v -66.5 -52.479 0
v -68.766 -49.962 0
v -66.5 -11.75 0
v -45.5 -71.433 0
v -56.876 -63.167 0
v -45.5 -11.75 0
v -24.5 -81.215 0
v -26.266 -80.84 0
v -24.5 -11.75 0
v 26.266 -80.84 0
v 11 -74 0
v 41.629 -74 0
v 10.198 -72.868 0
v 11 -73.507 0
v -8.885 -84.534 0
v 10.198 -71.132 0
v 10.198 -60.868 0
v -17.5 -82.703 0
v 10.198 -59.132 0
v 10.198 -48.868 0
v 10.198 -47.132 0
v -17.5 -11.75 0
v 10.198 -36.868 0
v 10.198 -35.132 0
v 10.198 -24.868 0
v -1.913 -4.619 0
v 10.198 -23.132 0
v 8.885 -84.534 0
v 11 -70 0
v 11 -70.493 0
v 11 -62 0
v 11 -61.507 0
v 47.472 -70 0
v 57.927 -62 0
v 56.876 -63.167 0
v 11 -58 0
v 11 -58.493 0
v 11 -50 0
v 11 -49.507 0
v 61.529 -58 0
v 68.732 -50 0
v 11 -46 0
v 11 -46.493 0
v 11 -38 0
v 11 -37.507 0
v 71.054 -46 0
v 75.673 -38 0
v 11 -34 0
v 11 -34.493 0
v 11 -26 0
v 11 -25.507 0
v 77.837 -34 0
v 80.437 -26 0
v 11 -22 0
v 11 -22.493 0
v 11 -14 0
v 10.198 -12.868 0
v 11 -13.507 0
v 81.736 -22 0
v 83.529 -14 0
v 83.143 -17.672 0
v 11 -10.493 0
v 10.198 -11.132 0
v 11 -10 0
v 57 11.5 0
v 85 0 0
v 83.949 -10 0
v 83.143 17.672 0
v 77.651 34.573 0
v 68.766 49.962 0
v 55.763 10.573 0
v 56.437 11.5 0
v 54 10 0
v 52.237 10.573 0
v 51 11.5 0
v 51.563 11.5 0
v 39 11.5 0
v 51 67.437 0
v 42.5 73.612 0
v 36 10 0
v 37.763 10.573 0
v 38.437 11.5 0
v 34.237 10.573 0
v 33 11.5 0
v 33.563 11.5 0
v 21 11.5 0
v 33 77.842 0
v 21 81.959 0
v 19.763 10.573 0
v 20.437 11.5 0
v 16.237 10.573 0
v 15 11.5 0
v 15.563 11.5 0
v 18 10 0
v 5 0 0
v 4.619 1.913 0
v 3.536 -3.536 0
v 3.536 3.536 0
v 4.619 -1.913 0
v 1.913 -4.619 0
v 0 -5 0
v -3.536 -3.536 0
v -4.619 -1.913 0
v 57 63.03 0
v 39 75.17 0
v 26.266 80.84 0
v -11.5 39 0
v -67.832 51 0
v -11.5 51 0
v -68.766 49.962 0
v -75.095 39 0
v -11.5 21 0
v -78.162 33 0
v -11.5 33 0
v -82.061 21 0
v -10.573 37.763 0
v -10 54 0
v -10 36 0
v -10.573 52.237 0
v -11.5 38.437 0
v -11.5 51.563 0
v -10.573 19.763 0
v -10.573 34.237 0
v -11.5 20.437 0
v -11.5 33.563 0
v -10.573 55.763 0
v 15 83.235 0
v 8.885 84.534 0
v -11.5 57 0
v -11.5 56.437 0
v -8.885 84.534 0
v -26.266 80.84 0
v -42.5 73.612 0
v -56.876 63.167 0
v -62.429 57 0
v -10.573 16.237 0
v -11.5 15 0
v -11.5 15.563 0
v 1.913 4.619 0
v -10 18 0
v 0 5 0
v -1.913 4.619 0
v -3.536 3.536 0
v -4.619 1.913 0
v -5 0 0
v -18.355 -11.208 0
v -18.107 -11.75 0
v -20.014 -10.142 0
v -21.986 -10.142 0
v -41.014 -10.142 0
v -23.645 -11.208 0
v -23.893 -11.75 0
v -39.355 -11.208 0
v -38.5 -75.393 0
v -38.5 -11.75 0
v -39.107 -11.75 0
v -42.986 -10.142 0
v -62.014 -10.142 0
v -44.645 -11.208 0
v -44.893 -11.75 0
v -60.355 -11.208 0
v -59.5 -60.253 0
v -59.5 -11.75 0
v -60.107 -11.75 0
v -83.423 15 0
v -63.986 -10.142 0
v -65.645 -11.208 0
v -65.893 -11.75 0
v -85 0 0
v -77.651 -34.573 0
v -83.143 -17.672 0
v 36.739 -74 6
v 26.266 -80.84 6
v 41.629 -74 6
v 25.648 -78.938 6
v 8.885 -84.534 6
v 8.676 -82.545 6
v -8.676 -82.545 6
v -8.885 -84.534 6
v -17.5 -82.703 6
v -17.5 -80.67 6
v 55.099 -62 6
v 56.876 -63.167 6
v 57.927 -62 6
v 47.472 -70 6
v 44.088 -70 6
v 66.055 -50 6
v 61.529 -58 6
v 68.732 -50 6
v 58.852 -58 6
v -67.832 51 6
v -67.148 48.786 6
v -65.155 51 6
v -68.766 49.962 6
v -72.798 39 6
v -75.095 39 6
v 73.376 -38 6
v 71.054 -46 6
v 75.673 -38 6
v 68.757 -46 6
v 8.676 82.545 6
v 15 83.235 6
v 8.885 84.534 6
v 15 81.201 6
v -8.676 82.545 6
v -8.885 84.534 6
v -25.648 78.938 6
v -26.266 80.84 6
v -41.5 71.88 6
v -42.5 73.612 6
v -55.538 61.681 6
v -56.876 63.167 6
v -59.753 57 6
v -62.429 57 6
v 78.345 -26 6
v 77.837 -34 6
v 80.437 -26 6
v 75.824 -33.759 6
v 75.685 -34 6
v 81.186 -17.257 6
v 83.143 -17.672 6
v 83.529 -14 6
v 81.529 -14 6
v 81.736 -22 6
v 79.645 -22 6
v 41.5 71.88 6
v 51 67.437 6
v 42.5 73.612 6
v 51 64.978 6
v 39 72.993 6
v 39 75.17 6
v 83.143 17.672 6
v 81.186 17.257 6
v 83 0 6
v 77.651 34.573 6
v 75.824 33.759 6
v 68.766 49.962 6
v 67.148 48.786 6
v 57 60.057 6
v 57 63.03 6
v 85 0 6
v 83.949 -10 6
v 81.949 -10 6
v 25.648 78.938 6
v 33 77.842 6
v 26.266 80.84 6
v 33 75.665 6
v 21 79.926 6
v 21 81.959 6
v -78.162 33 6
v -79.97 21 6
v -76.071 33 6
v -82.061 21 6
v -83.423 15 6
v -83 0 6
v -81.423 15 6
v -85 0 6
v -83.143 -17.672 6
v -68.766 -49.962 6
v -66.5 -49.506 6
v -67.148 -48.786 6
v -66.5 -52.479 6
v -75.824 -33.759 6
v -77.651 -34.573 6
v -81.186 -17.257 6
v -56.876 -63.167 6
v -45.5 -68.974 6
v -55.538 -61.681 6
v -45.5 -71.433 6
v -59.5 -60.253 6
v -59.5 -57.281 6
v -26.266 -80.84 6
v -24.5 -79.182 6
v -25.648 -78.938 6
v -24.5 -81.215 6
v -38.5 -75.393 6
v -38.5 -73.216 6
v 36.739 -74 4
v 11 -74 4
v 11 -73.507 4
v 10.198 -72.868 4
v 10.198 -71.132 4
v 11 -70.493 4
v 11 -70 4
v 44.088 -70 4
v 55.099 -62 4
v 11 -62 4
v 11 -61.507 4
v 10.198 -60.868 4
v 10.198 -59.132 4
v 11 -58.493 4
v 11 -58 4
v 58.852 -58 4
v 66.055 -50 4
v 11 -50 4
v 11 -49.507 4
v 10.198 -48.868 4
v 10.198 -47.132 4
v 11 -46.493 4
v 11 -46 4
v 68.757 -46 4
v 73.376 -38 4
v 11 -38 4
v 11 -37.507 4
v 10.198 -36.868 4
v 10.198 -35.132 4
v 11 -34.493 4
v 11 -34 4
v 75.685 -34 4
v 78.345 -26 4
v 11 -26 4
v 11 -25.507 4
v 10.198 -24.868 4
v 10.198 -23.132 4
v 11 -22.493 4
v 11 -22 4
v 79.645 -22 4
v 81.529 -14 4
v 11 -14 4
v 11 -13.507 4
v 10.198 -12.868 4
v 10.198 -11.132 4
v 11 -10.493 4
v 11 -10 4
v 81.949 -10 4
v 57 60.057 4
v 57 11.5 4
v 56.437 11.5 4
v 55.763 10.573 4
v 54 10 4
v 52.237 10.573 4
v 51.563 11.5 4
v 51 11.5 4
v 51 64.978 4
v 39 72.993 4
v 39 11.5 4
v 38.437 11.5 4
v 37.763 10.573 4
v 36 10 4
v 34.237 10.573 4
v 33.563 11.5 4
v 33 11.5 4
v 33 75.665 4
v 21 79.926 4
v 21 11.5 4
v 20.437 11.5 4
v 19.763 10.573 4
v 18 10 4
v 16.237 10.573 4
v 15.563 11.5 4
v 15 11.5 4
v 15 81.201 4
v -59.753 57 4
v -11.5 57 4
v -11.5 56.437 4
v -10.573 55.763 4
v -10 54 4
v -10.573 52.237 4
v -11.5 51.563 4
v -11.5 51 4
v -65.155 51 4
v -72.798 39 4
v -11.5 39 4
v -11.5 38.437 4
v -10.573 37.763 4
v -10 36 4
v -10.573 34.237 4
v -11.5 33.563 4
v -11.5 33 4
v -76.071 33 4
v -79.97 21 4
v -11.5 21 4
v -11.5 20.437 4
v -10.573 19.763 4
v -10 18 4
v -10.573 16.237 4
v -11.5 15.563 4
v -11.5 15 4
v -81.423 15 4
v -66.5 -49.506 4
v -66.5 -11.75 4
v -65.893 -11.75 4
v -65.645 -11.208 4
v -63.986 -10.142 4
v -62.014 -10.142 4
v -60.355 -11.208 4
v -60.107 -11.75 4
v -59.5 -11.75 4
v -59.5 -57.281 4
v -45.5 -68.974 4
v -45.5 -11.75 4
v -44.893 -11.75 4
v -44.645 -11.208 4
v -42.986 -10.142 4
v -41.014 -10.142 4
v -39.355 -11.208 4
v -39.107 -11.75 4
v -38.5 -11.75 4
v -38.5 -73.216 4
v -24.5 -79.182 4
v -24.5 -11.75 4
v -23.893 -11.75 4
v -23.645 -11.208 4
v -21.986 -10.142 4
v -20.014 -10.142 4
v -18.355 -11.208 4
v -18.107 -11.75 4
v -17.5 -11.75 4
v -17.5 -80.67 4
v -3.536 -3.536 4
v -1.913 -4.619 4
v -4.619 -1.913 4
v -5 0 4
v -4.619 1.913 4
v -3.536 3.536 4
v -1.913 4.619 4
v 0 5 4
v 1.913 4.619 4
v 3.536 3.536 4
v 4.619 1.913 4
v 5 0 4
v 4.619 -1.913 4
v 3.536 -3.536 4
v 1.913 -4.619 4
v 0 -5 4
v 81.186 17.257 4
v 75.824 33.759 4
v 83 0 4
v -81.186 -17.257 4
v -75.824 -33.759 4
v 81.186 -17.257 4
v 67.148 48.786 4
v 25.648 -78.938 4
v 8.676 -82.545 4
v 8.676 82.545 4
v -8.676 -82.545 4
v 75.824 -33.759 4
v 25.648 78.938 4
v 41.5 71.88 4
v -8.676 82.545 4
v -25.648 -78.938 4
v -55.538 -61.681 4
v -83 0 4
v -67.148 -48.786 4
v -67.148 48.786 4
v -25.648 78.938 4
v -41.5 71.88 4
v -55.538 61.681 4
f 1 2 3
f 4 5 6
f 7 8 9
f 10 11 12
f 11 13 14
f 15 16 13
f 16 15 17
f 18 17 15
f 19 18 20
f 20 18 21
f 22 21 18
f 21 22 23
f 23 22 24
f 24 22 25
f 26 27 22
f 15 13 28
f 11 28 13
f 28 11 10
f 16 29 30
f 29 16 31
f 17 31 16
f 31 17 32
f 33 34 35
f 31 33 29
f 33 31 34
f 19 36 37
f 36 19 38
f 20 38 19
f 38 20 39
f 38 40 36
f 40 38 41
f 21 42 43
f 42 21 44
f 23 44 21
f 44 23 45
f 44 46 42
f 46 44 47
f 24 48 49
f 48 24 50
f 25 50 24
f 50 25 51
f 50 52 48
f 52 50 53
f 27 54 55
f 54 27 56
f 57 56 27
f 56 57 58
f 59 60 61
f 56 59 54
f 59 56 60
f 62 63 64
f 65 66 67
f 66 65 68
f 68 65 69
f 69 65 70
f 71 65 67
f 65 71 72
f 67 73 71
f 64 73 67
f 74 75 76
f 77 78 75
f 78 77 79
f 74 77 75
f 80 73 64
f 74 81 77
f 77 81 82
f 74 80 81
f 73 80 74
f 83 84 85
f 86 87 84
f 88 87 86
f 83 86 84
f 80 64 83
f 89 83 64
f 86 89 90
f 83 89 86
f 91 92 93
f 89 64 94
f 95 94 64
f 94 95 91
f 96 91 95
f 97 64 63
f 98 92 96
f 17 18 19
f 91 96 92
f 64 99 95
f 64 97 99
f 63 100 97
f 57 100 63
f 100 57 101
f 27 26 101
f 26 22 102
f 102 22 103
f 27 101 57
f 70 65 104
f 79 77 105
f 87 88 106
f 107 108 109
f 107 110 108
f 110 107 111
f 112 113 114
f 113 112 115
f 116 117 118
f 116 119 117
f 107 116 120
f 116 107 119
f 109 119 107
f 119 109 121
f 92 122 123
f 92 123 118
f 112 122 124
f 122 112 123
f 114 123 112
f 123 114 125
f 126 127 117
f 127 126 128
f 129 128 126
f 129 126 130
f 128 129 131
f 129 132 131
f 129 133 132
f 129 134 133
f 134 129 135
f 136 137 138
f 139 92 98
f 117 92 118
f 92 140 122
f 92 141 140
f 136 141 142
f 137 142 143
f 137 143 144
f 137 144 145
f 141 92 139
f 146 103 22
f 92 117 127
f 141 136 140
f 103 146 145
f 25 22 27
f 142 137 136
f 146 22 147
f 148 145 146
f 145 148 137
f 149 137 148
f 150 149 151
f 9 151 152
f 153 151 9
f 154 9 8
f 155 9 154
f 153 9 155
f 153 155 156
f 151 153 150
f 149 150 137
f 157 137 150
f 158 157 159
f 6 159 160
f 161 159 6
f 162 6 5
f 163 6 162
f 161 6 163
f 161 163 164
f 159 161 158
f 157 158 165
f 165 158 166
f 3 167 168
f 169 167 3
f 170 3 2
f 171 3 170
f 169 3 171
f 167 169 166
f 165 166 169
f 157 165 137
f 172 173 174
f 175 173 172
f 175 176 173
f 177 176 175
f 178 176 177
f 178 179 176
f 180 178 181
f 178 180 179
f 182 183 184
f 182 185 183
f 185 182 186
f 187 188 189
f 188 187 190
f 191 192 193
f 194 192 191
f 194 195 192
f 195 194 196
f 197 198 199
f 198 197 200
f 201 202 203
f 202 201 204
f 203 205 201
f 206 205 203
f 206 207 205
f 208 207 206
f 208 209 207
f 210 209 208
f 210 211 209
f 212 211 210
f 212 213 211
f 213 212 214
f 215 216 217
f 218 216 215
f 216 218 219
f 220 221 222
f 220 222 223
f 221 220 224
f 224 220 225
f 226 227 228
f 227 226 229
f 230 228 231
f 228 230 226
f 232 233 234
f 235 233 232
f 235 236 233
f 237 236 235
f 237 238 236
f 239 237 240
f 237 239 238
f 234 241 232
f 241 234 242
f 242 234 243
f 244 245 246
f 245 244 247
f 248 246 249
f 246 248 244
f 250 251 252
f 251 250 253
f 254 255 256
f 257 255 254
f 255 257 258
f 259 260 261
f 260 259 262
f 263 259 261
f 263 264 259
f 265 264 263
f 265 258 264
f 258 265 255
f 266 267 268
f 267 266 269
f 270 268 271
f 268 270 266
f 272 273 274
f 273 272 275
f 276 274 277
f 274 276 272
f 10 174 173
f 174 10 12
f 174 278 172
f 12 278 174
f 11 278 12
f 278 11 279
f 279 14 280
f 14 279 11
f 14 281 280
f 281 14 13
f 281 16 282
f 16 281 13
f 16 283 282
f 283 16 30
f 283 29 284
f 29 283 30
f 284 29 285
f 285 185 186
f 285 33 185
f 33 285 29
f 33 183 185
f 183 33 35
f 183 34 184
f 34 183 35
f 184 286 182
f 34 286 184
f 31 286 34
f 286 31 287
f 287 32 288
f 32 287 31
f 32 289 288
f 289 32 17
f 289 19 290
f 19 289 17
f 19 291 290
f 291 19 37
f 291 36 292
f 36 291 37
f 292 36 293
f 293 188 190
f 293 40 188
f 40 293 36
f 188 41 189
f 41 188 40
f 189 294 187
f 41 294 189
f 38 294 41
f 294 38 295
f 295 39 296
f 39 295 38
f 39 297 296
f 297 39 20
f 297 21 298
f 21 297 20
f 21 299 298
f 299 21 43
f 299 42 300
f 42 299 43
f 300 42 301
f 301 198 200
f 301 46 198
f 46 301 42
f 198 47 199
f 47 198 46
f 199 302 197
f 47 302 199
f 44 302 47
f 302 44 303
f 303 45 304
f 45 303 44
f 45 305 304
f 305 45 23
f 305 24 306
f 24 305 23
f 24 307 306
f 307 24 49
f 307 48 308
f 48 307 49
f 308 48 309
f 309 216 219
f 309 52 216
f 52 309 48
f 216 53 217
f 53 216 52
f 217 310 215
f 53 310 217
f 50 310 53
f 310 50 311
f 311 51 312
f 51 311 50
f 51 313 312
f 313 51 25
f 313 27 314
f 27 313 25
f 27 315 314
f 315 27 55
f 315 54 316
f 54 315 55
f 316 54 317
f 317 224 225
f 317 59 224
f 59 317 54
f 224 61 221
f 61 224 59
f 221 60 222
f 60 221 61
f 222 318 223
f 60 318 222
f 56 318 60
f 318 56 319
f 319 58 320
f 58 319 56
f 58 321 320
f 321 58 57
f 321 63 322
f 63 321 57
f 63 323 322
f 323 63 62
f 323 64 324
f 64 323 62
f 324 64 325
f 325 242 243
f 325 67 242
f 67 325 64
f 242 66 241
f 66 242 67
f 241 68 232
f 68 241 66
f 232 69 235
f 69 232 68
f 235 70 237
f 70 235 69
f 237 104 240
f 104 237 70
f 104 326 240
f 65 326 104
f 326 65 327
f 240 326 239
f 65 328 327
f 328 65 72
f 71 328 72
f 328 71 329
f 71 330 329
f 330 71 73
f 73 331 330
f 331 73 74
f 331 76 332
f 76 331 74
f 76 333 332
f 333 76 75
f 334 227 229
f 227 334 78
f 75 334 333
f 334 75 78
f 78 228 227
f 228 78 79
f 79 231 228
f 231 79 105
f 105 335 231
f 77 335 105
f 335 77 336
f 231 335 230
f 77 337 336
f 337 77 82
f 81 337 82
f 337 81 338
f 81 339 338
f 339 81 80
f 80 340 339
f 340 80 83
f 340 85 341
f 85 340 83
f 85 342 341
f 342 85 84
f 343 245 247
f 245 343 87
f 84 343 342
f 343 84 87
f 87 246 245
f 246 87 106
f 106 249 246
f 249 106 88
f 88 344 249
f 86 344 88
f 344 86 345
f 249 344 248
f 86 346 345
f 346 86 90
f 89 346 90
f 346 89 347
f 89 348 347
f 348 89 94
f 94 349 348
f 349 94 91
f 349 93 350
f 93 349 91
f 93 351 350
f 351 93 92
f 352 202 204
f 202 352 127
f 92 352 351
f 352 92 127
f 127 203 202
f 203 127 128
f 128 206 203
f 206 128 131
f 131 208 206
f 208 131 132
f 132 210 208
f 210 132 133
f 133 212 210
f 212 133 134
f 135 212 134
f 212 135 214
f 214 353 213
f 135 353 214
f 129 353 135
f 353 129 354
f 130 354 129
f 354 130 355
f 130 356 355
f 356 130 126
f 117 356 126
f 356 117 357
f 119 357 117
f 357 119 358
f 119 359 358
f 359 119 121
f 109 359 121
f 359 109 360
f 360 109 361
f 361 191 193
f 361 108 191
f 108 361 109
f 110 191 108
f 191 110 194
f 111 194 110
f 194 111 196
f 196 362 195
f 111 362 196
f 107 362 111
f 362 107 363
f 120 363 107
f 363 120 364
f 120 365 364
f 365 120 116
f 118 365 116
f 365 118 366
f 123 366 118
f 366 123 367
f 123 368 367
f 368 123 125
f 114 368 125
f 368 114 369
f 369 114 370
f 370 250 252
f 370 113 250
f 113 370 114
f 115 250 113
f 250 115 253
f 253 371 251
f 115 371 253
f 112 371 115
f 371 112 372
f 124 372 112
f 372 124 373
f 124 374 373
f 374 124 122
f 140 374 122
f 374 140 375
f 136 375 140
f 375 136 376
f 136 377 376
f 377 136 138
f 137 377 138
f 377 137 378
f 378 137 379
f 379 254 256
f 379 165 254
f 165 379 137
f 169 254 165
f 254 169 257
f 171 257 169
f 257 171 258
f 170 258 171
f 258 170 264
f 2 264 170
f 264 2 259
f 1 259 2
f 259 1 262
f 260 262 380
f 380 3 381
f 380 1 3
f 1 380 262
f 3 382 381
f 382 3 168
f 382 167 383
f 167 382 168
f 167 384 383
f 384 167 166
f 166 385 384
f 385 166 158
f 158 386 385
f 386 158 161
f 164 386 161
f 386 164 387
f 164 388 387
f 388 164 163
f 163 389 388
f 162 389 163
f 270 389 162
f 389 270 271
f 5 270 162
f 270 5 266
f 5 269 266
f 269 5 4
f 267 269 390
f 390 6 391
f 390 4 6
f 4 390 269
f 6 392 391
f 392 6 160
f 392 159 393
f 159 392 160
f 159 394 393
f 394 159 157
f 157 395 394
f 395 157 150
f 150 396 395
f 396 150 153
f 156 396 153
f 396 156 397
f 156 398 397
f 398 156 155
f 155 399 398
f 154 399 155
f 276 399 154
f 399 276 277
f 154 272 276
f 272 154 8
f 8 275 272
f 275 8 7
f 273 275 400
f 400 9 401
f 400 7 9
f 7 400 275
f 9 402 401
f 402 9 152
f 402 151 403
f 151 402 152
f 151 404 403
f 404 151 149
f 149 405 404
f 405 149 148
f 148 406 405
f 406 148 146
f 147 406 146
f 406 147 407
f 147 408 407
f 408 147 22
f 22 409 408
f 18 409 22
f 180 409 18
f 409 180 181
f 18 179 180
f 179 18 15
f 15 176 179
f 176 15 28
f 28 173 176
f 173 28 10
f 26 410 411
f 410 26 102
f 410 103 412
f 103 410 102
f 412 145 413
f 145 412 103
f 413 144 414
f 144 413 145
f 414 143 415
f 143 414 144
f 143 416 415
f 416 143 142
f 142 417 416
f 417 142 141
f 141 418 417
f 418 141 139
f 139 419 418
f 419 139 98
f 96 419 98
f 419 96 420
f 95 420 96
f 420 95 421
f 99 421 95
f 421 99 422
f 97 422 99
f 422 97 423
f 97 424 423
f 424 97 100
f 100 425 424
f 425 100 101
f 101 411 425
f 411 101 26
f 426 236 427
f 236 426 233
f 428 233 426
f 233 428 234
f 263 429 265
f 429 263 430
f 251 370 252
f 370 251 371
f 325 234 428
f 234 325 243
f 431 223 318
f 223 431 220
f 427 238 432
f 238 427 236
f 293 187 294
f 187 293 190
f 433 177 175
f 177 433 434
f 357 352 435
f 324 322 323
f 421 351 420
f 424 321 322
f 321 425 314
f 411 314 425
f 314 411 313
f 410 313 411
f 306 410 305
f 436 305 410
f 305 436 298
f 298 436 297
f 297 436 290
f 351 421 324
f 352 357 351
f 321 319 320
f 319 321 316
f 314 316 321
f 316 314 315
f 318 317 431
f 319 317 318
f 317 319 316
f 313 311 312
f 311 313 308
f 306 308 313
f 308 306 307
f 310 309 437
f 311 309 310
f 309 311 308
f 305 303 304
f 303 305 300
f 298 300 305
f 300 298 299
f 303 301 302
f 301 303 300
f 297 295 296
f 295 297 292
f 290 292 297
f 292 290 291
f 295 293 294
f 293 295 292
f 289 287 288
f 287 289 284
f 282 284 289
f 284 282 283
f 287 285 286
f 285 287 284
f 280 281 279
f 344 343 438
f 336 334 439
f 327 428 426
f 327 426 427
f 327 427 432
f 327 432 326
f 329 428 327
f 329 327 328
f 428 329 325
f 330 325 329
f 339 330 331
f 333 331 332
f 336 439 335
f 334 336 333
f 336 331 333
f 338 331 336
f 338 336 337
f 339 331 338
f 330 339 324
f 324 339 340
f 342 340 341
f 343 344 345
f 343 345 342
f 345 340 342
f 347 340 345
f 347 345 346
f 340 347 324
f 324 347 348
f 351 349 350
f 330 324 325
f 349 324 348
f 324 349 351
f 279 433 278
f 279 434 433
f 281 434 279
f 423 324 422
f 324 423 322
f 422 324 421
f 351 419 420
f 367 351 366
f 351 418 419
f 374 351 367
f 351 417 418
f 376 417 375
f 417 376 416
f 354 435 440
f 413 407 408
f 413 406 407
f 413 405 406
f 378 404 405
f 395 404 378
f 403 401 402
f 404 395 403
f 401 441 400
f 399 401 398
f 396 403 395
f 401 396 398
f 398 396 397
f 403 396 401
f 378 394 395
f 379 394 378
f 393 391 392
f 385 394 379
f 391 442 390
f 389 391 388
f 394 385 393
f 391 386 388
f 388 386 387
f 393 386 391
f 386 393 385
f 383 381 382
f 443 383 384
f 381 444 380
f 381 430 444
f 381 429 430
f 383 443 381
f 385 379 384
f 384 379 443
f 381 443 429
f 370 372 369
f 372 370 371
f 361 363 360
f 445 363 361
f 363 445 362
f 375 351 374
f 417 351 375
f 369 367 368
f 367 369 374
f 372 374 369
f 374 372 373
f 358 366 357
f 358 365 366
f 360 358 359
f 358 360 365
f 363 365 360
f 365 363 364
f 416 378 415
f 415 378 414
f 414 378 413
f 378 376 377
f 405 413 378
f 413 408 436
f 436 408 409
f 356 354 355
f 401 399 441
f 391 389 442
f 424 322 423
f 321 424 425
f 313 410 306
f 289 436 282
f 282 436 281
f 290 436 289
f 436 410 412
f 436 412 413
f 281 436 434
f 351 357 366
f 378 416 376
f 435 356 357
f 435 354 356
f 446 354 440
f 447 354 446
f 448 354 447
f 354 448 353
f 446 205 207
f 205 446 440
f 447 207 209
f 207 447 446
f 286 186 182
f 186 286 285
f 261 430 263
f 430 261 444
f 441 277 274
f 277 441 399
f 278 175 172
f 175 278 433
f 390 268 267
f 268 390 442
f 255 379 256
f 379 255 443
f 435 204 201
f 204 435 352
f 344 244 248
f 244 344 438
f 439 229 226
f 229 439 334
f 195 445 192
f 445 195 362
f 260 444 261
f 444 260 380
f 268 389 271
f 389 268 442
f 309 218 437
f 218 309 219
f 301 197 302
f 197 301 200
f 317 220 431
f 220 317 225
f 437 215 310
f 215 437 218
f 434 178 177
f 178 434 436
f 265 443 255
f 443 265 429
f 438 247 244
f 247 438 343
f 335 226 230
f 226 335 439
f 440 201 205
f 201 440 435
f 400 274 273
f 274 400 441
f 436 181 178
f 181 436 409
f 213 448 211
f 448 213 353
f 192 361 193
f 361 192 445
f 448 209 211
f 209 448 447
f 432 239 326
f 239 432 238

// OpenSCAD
/*
    Cable Hanger.
    
    Mountable on a tripod, light stand, mic stand, 
    or any other pole-like object.    
*/

// Useful slot widths
usb = 4.0;      // for "thin" USB cables in mm.
fat_usb = 6.0;  // for "fat" USB cables in mm.
power = 7.0;    // for power cables in mm.

// Useful mount diameters
photo_large = 10.0;  // for 3/8"-16 threaded bolt.
photo_small = 7.0;   // for 1/4"-20 threaded bolt.
mic_stand = 16.0;    // for 5/8"-27 threaded bolt.

// Parameters
h_rack = 4.0;            // height of rack base in mm. Too thin, and it will flex.
h_lip = 2.0;             // height of rack lip above the base in mm.
w_lip = 2.0;             // width of rack lip in mm.
d_rack = 170;            // diameter of rack in mm.
d_mount = photo_large;   // diameter of mounting hole in mm.
slot_width = usb;        // default slot width in mm.

// Derived values
r_rack = d_rack / 2;    // radius of rack.
r_mount = d_mount / 2;  // radius of mounting hole.
slot_length = r_rack - r_mount;

module slot(width) {
    square_length = slot_length - (width / 2);
    offset = (slot_length - width) / 2;
    union() {
        square([square_length, width], true);
        translate([-offset, 0, 0]) {
            circle(d = width);
        }
    }
}

module slots(width=slot_width) {
    shift = width * 3;
    max_y = floor(r_rack / shift) - 1;
    for (y = [1:max_y]) {
        y_offset = y * shift;
        translate([slot_length / 2 + d_mount, -y_offset, 0]) slot(width);
    }
}

module rack_mask() {
    difference() {
        circle(d = d_rack);
        circle(d = d_mount);
        slots(usb);
        rotate(90, [0, 0, 1]) slots(fat_usb);
        rotate(180, [0, 0, 1]) slots(fat_usb);
        rotate(270, [0, 0, 1]) slots(power);
    }
}

module rack() {
    difference() {
        linear_extrude(h_rack + h_lip) rack_mask();
        translate([0, 0, h_rack]) linear_extrude(h_lip) circle(r = r_rack - w_lip);
    }
}

rack();
